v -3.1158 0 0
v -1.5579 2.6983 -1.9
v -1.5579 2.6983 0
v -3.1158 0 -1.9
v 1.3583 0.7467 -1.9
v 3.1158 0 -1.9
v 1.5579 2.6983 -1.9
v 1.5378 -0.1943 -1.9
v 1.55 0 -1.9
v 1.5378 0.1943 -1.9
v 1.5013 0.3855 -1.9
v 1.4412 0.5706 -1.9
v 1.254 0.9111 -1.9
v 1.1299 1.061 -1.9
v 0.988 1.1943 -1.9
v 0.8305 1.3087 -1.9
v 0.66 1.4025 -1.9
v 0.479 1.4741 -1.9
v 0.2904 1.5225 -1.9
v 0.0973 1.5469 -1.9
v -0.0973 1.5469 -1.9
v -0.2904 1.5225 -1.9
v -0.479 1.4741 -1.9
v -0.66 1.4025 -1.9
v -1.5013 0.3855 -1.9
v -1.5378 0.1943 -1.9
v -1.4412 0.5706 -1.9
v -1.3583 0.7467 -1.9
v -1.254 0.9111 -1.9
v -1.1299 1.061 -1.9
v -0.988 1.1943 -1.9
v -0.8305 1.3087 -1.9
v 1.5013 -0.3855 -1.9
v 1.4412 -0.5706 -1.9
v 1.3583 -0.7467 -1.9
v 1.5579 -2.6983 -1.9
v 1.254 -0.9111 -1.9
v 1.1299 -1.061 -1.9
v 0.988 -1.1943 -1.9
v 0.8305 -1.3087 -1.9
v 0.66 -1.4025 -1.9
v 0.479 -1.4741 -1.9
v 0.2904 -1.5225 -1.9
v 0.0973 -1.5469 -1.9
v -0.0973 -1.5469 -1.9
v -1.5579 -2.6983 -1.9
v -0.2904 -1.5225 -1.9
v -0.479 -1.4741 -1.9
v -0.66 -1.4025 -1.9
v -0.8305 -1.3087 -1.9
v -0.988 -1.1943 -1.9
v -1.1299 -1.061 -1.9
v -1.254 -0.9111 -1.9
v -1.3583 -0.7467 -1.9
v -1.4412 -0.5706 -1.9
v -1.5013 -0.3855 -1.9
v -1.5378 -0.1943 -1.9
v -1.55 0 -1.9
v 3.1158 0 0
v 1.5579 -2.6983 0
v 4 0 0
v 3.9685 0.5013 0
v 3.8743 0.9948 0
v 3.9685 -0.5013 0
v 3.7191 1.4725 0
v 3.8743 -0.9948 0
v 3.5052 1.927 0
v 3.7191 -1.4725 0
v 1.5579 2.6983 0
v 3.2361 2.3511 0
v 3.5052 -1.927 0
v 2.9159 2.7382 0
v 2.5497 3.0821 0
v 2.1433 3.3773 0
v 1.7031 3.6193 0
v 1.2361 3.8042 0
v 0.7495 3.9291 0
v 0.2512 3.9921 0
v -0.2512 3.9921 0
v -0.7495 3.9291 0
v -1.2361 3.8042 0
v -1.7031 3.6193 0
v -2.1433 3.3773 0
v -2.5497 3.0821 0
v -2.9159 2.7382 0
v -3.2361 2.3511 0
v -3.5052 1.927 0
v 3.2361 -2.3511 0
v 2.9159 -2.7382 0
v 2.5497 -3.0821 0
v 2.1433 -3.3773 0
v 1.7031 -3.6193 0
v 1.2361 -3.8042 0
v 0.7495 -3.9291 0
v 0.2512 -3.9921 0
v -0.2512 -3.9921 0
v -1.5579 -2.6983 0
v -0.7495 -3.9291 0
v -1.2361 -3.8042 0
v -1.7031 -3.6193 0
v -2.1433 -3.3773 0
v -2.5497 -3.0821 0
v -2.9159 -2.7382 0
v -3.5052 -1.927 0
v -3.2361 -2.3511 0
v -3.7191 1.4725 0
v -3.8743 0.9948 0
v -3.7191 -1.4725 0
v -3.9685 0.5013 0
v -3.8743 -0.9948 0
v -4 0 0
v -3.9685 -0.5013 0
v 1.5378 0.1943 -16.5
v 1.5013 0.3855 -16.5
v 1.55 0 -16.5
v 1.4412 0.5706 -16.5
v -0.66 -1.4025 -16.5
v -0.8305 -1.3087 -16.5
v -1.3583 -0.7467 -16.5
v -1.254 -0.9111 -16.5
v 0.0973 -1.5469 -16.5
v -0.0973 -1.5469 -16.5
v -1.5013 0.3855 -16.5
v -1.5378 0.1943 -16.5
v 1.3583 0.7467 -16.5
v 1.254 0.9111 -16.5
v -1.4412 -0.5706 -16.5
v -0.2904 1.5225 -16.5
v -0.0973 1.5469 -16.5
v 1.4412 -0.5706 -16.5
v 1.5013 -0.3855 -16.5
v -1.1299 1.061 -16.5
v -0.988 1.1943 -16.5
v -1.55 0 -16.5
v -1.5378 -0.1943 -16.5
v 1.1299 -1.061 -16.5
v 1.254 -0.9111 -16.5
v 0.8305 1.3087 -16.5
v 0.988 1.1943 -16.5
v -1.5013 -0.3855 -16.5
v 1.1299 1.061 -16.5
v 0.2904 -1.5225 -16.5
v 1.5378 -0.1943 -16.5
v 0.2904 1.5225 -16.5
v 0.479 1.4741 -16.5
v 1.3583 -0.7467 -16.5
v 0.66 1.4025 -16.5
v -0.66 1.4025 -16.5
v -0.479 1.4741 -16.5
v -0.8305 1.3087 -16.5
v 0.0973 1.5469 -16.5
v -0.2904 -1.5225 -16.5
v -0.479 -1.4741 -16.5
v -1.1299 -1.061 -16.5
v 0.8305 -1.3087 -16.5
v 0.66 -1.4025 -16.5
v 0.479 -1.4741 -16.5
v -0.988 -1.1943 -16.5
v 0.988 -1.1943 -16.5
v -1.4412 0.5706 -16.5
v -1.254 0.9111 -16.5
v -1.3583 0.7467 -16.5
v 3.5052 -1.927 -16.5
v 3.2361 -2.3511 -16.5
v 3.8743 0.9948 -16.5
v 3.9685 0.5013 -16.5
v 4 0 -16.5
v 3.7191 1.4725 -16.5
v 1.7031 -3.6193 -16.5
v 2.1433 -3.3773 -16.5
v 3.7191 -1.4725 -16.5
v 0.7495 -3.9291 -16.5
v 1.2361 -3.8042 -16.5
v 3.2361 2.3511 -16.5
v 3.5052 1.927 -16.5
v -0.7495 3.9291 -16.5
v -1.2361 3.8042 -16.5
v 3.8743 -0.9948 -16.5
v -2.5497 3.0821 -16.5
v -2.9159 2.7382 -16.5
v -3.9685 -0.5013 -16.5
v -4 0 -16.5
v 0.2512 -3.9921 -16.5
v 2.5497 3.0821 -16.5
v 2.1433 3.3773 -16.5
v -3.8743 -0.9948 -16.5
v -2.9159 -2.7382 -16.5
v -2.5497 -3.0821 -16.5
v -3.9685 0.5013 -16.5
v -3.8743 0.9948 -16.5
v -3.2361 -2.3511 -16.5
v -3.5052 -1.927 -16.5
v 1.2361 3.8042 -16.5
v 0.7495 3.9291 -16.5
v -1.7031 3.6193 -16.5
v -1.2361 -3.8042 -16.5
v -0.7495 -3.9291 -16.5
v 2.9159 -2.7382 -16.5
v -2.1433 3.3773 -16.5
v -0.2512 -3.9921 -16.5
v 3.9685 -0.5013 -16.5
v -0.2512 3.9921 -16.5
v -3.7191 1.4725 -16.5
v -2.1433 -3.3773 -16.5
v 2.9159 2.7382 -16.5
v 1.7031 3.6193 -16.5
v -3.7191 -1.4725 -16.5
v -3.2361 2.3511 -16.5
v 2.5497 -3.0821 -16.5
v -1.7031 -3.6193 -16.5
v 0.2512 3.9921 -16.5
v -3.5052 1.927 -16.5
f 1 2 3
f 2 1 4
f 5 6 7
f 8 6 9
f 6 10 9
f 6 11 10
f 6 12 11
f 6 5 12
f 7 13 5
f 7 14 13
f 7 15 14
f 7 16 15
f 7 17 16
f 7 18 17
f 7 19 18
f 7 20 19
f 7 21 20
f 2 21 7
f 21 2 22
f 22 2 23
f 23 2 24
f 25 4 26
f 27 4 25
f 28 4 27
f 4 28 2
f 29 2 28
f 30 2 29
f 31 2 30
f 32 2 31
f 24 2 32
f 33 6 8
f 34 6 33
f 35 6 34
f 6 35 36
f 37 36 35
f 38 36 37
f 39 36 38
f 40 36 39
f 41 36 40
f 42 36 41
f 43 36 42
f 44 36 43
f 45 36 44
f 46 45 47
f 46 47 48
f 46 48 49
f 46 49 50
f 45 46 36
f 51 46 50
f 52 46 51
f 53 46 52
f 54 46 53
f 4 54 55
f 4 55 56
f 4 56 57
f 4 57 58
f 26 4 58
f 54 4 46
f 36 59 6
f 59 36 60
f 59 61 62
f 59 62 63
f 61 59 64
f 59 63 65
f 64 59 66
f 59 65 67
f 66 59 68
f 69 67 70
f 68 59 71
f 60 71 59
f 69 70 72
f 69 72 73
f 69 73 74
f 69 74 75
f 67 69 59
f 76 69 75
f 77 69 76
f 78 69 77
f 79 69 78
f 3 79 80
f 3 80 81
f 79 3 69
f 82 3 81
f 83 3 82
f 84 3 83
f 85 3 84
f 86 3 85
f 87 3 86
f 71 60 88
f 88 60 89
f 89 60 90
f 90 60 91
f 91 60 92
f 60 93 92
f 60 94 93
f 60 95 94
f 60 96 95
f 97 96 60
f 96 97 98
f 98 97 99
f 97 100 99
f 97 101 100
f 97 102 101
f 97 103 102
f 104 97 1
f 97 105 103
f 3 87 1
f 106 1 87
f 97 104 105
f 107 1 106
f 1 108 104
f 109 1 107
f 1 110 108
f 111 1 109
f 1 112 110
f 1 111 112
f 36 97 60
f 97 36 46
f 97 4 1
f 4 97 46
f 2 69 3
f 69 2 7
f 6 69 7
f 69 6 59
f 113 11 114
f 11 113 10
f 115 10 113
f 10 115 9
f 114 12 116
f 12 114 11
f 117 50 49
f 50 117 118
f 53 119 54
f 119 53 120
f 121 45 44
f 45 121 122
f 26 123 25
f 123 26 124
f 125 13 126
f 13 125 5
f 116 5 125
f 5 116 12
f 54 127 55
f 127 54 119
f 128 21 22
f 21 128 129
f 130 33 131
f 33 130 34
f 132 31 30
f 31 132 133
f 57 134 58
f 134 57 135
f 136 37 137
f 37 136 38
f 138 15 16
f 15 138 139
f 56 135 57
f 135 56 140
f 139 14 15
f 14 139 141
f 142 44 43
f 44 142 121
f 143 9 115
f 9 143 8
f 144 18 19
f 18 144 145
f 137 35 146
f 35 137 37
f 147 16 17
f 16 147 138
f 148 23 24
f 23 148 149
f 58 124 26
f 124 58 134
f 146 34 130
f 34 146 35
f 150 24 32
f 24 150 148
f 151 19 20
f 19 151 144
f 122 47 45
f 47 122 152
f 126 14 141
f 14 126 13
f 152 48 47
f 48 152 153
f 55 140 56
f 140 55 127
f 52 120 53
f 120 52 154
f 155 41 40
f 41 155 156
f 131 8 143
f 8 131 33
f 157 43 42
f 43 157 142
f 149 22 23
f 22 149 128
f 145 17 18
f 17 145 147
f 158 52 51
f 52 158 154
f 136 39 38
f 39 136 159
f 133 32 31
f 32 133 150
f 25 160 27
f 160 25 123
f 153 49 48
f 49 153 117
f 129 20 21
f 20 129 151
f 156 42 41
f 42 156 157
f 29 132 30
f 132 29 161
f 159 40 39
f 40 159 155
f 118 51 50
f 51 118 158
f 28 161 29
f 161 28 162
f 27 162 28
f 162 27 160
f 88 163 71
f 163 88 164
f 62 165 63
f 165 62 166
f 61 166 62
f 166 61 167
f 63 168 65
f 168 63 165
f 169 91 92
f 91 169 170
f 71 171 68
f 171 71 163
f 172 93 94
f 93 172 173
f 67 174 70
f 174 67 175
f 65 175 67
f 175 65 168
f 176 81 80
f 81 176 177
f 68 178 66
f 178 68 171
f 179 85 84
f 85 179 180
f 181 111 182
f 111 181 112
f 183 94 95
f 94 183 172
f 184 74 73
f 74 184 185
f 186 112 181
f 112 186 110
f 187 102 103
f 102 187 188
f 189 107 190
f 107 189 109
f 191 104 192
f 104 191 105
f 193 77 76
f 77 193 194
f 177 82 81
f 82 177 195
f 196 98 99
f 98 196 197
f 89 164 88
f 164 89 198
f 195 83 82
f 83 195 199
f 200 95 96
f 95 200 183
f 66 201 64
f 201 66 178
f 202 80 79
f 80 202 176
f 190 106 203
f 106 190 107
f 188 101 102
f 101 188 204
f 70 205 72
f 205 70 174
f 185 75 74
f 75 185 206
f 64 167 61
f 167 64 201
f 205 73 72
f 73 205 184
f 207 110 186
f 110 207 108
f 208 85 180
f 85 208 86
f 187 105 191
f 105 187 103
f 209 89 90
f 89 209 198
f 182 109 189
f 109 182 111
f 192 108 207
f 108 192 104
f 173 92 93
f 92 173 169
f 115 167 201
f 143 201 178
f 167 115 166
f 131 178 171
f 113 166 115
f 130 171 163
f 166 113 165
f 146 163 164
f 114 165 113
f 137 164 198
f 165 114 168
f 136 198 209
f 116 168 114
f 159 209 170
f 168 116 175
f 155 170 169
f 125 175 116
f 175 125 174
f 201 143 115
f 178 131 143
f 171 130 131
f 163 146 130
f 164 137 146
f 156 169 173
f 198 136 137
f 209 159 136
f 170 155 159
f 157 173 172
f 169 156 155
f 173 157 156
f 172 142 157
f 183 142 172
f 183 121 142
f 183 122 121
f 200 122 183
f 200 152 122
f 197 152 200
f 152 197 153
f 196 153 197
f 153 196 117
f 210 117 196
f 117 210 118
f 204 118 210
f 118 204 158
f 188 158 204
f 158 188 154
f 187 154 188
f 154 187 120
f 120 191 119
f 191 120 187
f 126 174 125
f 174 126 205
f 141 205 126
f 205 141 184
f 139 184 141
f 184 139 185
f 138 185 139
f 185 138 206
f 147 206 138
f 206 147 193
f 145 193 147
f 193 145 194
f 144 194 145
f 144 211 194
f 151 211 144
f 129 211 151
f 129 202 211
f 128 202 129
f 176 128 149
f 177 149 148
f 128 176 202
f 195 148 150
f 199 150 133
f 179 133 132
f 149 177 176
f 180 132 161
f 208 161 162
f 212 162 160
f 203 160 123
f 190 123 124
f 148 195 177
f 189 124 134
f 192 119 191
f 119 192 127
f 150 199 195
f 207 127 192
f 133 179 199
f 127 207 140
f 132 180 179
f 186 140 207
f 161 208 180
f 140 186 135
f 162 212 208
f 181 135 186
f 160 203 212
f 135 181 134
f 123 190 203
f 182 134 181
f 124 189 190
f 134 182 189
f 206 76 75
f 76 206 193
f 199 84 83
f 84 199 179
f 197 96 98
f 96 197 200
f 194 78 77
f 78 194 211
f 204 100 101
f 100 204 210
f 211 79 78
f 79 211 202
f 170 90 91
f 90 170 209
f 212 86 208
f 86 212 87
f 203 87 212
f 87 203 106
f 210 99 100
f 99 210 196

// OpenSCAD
$fn = 50;

difference() {
	union() {
		translate(v = [0, 0, -16.5]) {
			cylinder(h = 16.5, r = 4.0);
		}
	}
	union() {
		translate(v = [0, 0, 0]) {
			rotate(a = [0, 0, 0]) {
				difference() {
					union() {
						translate(v = [0, 0, -1.9]) {
							linear_extrude(height = 1.9) {
								polygon(points = [[3.1158, 0.0], [1.5579000000000005, 2.698361953111554], [-1.5578999999999994, 2.6983619531115544], [-3.1158, 3.815754496783323e-16], [-1.5579000000000014, -2.6983619531115535], [1.557899999999998, -2.6983619531115552]]);
							}
						}
					}
					union();
				}
			}
		}
		#translate(v = [0, 0, -100.0]) {
			cylinder(h = 200, r = 1.55);
		}
	}
}
